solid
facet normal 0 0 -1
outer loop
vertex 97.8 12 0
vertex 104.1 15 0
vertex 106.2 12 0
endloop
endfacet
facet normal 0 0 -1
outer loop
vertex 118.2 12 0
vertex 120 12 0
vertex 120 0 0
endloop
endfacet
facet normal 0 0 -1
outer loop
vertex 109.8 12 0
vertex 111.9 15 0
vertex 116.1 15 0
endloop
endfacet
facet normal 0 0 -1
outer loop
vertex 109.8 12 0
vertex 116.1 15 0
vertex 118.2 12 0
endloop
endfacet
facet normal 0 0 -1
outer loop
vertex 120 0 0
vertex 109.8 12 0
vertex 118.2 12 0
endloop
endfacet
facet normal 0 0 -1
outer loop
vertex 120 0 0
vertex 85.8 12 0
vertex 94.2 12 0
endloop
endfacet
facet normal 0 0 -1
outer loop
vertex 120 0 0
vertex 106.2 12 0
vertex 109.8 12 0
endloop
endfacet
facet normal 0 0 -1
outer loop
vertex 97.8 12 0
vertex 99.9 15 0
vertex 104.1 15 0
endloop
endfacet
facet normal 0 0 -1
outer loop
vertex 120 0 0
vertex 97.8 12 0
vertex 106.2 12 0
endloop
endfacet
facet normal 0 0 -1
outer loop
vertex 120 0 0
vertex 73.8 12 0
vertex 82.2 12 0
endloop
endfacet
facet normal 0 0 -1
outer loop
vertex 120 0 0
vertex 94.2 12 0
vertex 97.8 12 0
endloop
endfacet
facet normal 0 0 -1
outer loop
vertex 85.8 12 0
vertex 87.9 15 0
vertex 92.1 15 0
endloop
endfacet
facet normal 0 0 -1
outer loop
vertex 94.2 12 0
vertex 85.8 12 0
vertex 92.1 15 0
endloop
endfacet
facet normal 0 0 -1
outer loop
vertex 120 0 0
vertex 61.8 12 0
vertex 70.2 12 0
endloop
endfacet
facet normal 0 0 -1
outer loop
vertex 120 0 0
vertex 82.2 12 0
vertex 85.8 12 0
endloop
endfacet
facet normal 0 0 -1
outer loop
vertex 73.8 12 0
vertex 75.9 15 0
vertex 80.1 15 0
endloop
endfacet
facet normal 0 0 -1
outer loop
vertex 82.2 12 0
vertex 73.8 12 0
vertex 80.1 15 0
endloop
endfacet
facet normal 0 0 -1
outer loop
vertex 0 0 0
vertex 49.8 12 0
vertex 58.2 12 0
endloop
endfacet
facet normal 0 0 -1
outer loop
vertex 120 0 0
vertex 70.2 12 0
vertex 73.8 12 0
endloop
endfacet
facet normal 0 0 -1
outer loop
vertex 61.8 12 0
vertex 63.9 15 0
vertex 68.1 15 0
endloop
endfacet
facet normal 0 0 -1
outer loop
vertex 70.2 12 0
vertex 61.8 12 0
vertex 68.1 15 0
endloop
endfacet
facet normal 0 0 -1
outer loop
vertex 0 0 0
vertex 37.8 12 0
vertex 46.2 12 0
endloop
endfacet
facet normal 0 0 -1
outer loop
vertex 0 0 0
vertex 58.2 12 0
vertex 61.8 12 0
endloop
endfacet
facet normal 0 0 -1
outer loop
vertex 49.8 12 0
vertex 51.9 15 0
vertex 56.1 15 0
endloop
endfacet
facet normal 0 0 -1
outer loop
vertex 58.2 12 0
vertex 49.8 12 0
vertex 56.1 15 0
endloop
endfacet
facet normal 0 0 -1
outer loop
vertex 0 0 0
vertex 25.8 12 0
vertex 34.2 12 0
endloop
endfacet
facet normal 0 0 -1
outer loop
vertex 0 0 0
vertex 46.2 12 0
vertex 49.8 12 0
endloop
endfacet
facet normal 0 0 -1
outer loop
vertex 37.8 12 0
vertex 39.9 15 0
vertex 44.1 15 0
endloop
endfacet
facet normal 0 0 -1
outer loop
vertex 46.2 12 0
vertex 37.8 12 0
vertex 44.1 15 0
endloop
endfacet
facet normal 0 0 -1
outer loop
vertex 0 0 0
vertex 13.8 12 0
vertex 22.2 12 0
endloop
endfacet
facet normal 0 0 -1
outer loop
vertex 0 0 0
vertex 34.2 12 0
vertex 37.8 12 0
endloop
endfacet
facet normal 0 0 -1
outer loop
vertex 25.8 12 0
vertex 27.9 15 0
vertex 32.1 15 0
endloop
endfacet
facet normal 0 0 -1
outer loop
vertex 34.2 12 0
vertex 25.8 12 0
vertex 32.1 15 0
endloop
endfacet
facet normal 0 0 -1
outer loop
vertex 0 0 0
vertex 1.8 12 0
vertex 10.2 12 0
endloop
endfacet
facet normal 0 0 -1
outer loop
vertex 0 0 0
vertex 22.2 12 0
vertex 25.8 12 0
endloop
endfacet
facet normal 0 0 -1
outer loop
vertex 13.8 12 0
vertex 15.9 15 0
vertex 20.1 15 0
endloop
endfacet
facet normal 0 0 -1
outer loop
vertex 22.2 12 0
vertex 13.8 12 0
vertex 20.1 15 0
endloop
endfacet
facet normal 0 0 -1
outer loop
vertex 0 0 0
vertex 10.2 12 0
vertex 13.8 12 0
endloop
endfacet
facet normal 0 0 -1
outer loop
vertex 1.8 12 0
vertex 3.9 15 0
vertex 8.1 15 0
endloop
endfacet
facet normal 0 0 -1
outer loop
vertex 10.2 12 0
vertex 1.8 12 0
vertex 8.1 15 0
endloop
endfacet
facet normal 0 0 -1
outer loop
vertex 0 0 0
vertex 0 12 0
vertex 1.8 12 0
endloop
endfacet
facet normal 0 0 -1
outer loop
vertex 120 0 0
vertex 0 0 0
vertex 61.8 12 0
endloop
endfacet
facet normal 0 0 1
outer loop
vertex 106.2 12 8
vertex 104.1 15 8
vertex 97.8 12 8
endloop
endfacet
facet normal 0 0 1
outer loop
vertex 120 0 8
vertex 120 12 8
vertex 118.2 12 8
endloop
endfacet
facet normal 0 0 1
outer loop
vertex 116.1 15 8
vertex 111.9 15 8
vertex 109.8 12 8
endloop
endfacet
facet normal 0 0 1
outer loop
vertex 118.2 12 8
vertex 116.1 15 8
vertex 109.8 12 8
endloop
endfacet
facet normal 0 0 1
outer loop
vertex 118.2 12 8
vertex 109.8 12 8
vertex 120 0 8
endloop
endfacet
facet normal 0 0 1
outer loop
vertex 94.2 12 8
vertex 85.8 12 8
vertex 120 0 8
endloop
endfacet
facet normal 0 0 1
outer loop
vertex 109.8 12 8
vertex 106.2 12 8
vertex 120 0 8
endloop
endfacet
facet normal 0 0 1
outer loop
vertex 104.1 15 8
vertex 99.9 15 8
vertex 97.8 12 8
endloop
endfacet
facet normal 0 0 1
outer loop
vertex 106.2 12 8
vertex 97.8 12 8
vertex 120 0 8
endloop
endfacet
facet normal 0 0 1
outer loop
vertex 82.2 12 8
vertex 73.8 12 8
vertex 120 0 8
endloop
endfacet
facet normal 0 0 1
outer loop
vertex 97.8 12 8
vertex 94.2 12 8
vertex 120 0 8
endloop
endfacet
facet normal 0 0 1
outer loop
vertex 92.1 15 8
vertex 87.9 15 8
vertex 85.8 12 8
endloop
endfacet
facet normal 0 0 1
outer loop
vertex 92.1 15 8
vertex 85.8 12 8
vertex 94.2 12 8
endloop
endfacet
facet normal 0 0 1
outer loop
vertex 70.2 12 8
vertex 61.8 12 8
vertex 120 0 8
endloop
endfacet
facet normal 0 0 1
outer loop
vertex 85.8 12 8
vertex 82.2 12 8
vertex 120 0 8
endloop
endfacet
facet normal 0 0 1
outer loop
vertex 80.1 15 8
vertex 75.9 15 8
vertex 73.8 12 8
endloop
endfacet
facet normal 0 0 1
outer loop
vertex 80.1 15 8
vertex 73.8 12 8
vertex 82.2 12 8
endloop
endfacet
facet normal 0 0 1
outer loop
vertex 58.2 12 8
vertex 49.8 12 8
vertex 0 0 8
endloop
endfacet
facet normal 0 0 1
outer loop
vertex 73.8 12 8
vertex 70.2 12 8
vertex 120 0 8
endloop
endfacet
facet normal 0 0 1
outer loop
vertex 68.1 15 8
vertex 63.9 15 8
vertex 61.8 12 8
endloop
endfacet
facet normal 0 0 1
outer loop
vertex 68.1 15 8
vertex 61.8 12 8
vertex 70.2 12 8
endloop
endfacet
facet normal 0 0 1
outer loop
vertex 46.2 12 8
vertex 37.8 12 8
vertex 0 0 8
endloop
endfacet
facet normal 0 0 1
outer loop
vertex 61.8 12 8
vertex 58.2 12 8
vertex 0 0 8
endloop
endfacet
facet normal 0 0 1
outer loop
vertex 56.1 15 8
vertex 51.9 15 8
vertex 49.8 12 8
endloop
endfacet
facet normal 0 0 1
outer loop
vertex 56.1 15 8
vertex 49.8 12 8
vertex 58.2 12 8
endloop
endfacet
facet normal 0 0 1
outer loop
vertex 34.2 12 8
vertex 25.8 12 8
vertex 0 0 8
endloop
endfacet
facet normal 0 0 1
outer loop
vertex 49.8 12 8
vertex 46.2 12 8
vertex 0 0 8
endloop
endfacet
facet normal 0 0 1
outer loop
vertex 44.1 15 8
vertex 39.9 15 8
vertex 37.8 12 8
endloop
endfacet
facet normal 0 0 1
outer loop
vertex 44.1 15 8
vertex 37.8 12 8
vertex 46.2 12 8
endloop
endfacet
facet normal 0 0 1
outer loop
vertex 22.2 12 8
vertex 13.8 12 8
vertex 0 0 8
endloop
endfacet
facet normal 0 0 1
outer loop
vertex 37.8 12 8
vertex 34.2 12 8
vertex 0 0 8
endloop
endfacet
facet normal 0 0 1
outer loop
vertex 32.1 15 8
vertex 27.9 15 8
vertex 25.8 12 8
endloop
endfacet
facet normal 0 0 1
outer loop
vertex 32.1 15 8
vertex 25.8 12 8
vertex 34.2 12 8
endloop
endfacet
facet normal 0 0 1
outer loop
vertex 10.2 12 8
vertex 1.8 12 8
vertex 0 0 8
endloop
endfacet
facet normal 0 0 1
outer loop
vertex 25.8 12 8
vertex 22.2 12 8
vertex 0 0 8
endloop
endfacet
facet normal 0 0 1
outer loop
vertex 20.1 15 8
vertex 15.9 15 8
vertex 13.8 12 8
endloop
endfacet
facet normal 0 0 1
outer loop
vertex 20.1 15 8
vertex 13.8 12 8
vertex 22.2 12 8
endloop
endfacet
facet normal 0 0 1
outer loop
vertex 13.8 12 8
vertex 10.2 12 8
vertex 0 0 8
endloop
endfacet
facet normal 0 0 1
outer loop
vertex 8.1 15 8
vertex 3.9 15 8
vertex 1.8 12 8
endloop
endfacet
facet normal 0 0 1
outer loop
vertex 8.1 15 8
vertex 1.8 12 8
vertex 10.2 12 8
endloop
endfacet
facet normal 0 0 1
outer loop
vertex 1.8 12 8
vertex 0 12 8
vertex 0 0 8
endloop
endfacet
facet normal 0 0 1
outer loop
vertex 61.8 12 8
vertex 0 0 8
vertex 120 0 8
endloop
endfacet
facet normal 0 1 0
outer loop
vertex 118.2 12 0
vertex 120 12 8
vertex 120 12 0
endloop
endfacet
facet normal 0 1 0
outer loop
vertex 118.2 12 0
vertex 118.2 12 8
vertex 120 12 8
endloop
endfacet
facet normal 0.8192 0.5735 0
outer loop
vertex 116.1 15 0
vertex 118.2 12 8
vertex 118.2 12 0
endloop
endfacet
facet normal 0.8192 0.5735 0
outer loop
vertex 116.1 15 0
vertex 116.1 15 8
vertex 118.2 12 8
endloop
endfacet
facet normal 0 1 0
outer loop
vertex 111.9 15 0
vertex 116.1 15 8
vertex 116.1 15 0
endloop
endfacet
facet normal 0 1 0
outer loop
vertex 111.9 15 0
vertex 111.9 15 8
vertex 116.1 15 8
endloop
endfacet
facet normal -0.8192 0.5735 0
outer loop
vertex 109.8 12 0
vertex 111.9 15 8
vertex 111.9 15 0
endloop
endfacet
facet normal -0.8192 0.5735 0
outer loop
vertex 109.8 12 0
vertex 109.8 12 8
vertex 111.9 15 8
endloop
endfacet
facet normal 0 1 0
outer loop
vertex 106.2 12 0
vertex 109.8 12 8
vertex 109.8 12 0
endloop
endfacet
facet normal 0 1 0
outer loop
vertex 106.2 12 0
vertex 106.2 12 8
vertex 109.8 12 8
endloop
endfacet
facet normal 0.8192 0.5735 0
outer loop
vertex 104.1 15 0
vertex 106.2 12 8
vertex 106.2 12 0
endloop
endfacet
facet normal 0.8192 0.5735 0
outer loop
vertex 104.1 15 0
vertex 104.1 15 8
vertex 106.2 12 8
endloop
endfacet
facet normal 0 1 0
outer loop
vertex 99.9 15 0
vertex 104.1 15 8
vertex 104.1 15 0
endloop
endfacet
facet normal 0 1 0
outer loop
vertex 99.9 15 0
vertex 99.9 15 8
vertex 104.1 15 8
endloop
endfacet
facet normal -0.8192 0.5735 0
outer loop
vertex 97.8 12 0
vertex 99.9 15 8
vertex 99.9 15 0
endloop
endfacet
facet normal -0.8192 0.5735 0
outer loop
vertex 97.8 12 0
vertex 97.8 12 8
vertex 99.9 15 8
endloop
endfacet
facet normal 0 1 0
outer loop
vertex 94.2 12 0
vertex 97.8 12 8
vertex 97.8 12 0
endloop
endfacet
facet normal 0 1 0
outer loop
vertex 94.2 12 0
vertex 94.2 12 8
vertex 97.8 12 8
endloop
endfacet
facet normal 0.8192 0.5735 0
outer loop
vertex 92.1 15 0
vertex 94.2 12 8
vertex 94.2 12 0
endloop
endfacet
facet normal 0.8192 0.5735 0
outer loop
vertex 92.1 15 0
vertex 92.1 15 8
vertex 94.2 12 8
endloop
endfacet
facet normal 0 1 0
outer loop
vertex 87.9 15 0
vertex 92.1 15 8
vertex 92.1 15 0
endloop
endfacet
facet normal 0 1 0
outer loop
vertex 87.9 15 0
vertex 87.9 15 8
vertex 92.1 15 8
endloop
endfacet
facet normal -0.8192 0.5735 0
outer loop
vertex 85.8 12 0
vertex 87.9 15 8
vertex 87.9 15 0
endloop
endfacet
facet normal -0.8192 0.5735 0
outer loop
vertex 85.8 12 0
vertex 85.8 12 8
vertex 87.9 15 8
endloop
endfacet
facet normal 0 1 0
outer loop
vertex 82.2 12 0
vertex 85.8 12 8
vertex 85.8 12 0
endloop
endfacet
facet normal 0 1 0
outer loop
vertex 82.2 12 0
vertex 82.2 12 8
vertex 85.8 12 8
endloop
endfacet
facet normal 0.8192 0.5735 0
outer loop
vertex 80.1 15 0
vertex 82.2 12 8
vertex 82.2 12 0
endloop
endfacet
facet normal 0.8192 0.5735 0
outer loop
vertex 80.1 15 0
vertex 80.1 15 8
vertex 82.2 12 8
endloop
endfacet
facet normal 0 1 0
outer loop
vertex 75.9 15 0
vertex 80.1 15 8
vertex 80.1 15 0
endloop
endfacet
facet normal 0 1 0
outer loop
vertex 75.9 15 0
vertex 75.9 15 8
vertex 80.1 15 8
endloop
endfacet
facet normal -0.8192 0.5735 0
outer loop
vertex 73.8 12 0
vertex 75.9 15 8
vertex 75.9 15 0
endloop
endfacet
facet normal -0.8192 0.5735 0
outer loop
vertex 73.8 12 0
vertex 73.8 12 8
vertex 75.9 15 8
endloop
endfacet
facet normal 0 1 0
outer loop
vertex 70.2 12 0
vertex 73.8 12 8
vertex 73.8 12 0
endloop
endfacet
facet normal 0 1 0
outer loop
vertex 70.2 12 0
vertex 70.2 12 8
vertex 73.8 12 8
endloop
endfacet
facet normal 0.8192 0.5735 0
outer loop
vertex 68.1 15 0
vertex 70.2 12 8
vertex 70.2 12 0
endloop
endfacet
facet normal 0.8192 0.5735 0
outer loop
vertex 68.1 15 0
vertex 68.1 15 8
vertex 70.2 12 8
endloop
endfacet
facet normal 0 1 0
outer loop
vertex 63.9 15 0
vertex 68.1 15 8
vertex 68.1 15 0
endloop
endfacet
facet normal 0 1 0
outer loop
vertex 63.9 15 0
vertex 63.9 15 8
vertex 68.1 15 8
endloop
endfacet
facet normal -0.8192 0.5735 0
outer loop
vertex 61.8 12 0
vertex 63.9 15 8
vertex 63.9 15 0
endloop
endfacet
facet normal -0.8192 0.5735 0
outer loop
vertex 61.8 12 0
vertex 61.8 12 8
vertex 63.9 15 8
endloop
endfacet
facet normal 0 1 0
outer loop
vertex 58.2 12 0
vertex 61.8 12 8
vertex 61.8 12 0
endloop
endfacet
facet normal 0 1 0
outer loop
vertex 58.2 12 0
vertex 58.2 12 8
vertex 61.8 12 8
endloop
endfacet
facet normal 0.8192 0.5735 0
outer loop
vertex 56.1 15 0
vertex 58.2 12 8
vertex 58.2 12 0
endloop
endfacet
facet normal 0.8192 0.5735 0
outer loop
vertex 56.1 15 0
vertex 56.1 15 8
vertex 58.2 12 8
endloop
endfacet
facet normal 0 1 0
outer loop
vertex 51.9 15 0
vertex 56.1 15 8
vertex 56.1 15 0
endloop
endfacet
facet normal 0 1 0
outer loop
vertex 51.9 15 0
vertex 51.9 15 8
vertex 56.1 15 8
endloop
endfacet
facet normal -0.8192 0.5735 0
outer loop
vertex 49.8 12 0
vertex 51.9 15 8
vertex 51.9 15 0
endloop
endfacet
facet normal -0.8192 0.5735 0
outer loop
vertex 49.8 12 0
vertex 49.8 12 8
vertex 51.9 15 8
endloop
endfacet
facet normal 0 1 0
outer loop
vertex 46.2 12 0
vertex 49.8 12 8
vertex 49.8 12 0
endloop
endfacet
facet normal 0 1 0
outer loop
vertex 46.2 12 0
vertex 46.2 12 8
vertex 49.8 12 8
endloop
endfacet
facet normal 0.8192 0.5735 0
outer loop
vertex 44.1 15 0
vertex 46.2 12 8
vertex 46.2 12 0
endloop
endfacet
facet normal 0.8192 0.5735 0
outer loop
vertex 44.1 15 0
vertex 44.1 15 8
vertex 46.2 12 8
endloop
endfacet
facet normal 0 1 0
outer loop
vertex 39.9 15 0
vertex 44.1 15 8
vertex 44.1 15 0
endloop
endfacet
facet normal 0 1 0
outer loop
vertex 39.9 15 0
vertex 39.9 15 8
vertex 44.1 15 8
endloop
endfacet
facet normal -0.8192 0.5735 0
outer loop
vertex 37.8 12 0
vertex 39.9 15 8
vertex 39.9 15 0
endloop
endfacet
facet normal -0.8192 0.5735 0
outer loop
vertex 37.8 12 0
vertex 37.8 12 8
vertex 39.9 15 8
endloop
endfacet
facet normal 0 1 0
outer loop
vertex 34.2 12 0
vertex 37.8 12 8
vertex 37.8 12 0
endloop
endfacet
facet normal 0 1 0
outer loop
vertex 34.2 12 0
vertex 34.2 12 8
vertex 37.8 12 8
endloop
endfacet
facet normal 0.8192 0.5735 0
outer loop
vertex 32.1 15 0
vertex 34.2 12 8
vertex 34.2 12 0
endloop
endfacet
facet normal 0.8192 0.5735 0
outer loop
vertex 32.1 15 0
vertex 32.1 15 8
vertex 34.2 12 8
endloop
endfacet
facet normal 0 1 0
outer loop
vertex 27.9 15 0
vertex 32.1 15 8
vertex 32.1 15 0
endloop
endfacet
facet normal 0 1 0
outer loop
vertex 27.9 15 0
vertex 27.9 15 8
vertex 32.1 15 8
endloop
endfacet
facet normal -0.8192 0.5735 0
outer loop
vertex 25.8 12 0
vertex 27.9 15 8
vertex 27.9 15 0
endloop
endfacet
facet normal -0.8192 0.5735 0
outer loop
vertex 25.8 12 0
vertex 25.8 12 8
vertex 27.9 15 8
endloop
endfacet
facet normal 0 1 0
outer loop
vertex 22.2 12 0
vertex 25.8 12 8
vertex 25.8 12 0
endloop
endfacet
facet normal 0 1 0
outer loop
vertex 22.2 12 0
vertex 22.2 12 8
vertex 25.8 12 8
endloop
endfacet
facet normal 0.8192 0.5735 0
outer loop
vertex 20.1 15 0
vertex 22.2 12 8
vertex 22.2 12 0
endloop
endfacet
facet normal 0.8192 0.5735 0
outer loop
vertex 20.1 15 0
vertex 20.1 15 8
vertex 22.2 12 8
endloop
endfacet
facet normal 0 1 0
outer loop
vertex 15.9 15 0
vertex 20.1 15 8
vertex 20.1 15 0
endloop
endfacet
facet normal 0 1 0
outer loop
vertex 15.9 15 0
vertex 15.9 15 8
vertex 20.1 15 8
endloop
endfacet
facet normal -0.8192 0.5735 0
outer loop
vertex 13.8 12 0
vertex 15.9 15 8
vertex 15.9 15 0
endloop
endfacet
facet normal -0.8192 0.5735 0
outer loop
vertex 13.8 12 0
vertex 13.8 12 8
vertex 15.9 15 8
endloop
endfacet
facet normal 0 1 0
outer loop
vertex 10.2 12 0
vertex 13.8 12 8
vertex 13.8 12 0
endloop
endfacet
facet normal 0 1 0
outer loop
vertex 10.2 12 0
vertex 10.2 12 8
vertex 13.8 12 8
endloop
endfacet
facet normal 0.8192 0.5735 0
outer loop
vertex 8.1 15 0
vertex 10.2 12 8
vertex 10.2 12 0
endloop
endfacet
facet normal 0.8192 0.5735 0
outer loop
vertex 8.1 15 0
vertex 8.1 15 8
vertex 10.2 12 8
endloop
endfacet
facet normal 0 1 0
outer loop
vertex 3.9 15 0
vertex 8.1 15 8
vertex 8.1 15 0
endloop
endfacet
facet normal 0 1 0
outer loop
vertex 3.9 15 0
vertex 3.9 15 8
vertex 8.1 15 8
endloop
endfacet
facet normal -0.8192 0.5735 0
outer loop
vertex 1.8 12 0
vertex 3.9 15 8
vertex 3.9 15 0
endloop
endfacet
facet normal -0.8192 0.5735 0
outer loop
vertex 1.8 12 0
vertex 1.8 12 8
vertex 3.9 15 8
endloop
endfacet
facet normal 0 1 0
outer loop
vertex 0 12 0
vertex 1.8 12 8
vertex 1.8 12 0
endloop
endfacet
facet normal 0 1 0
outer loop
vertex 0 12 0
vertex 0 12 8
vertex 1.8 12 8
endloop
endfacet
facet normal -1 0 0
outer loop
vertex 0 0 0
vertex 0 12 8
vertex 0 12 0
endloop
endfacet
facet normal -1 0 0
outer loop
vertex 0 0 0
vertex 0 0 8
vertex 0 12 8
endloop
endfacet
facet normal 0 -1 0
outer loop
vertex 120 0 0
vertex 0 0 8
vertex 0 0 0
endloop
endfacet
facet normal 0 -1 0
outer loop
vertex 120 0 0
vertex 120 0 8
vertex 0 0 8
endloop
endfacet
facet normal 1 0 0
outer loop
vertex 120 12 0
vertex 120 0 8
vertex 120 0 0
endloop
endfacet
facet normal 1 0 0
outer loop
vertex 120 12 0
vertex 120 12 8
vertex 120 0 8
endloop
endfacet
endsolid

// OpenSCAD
$fn = 32;

// ----------------------------------------------------------------------
// Gear rack: 10 teeth, pitch 12 mm
// ----------------------------------------------------------------------

// --- parameters (mm) ---
teeth = 10;               // number of teeth
pitch = 12;               // tooth pitch, X
root_w = 8.4;             // tooth width at the root
tip_w = 4.2;              // tooth width at the tip
base_h = 12;              // rack body height, Y
tooth_h = 3;              // tooth height above the body
plate_t = 8;              // rack width, Z (extrusion height)
fit_tol = 0.1;            // declared fit tolerance (prompt contract)
free_tol = 0.3;           // declared free tolerance (prompt contract)

rack_l = teeth * pitch;  // overall length
total_h = base_h + tooth_h;  // overall height

profile = [[0, 0], [120, 0], [120, 12], [118.2, 12], [116.1, 15], [111.9, 15], [109.8, 12], [106.2, 12], [104.1, 15], [99.9, 15], [97.8, 12], [94.2, 12], [92.1, 15], [87.9, 15], [85.8, 12], [82.2, 12], [80.1, 15], [75.9, 15], [73.8, 12], [70.2, 12], [68.1, 15], [63.9, 15], [61.8, 12], [58.2, 12], [56.1, 15], [51.9, 15], [49.8, 12], [46.2, 12], [44.1, 15], [39.9, 15], [37.8, 12], [34.2, 12], [32.1, 15], [27.9, 15], [25.8, 12], [22.2, 12], [20.1, 15], [15.9, 15], [13.8, 12], [10.2, 12], [8.1, 15], [3.9, 15], [1.8, 12], [0, 12]];  // primary outline, 44 points, counter clockwise

// --- the one profile operation ---
linear_extrude(height = plate_t) polygon(points = profile);
